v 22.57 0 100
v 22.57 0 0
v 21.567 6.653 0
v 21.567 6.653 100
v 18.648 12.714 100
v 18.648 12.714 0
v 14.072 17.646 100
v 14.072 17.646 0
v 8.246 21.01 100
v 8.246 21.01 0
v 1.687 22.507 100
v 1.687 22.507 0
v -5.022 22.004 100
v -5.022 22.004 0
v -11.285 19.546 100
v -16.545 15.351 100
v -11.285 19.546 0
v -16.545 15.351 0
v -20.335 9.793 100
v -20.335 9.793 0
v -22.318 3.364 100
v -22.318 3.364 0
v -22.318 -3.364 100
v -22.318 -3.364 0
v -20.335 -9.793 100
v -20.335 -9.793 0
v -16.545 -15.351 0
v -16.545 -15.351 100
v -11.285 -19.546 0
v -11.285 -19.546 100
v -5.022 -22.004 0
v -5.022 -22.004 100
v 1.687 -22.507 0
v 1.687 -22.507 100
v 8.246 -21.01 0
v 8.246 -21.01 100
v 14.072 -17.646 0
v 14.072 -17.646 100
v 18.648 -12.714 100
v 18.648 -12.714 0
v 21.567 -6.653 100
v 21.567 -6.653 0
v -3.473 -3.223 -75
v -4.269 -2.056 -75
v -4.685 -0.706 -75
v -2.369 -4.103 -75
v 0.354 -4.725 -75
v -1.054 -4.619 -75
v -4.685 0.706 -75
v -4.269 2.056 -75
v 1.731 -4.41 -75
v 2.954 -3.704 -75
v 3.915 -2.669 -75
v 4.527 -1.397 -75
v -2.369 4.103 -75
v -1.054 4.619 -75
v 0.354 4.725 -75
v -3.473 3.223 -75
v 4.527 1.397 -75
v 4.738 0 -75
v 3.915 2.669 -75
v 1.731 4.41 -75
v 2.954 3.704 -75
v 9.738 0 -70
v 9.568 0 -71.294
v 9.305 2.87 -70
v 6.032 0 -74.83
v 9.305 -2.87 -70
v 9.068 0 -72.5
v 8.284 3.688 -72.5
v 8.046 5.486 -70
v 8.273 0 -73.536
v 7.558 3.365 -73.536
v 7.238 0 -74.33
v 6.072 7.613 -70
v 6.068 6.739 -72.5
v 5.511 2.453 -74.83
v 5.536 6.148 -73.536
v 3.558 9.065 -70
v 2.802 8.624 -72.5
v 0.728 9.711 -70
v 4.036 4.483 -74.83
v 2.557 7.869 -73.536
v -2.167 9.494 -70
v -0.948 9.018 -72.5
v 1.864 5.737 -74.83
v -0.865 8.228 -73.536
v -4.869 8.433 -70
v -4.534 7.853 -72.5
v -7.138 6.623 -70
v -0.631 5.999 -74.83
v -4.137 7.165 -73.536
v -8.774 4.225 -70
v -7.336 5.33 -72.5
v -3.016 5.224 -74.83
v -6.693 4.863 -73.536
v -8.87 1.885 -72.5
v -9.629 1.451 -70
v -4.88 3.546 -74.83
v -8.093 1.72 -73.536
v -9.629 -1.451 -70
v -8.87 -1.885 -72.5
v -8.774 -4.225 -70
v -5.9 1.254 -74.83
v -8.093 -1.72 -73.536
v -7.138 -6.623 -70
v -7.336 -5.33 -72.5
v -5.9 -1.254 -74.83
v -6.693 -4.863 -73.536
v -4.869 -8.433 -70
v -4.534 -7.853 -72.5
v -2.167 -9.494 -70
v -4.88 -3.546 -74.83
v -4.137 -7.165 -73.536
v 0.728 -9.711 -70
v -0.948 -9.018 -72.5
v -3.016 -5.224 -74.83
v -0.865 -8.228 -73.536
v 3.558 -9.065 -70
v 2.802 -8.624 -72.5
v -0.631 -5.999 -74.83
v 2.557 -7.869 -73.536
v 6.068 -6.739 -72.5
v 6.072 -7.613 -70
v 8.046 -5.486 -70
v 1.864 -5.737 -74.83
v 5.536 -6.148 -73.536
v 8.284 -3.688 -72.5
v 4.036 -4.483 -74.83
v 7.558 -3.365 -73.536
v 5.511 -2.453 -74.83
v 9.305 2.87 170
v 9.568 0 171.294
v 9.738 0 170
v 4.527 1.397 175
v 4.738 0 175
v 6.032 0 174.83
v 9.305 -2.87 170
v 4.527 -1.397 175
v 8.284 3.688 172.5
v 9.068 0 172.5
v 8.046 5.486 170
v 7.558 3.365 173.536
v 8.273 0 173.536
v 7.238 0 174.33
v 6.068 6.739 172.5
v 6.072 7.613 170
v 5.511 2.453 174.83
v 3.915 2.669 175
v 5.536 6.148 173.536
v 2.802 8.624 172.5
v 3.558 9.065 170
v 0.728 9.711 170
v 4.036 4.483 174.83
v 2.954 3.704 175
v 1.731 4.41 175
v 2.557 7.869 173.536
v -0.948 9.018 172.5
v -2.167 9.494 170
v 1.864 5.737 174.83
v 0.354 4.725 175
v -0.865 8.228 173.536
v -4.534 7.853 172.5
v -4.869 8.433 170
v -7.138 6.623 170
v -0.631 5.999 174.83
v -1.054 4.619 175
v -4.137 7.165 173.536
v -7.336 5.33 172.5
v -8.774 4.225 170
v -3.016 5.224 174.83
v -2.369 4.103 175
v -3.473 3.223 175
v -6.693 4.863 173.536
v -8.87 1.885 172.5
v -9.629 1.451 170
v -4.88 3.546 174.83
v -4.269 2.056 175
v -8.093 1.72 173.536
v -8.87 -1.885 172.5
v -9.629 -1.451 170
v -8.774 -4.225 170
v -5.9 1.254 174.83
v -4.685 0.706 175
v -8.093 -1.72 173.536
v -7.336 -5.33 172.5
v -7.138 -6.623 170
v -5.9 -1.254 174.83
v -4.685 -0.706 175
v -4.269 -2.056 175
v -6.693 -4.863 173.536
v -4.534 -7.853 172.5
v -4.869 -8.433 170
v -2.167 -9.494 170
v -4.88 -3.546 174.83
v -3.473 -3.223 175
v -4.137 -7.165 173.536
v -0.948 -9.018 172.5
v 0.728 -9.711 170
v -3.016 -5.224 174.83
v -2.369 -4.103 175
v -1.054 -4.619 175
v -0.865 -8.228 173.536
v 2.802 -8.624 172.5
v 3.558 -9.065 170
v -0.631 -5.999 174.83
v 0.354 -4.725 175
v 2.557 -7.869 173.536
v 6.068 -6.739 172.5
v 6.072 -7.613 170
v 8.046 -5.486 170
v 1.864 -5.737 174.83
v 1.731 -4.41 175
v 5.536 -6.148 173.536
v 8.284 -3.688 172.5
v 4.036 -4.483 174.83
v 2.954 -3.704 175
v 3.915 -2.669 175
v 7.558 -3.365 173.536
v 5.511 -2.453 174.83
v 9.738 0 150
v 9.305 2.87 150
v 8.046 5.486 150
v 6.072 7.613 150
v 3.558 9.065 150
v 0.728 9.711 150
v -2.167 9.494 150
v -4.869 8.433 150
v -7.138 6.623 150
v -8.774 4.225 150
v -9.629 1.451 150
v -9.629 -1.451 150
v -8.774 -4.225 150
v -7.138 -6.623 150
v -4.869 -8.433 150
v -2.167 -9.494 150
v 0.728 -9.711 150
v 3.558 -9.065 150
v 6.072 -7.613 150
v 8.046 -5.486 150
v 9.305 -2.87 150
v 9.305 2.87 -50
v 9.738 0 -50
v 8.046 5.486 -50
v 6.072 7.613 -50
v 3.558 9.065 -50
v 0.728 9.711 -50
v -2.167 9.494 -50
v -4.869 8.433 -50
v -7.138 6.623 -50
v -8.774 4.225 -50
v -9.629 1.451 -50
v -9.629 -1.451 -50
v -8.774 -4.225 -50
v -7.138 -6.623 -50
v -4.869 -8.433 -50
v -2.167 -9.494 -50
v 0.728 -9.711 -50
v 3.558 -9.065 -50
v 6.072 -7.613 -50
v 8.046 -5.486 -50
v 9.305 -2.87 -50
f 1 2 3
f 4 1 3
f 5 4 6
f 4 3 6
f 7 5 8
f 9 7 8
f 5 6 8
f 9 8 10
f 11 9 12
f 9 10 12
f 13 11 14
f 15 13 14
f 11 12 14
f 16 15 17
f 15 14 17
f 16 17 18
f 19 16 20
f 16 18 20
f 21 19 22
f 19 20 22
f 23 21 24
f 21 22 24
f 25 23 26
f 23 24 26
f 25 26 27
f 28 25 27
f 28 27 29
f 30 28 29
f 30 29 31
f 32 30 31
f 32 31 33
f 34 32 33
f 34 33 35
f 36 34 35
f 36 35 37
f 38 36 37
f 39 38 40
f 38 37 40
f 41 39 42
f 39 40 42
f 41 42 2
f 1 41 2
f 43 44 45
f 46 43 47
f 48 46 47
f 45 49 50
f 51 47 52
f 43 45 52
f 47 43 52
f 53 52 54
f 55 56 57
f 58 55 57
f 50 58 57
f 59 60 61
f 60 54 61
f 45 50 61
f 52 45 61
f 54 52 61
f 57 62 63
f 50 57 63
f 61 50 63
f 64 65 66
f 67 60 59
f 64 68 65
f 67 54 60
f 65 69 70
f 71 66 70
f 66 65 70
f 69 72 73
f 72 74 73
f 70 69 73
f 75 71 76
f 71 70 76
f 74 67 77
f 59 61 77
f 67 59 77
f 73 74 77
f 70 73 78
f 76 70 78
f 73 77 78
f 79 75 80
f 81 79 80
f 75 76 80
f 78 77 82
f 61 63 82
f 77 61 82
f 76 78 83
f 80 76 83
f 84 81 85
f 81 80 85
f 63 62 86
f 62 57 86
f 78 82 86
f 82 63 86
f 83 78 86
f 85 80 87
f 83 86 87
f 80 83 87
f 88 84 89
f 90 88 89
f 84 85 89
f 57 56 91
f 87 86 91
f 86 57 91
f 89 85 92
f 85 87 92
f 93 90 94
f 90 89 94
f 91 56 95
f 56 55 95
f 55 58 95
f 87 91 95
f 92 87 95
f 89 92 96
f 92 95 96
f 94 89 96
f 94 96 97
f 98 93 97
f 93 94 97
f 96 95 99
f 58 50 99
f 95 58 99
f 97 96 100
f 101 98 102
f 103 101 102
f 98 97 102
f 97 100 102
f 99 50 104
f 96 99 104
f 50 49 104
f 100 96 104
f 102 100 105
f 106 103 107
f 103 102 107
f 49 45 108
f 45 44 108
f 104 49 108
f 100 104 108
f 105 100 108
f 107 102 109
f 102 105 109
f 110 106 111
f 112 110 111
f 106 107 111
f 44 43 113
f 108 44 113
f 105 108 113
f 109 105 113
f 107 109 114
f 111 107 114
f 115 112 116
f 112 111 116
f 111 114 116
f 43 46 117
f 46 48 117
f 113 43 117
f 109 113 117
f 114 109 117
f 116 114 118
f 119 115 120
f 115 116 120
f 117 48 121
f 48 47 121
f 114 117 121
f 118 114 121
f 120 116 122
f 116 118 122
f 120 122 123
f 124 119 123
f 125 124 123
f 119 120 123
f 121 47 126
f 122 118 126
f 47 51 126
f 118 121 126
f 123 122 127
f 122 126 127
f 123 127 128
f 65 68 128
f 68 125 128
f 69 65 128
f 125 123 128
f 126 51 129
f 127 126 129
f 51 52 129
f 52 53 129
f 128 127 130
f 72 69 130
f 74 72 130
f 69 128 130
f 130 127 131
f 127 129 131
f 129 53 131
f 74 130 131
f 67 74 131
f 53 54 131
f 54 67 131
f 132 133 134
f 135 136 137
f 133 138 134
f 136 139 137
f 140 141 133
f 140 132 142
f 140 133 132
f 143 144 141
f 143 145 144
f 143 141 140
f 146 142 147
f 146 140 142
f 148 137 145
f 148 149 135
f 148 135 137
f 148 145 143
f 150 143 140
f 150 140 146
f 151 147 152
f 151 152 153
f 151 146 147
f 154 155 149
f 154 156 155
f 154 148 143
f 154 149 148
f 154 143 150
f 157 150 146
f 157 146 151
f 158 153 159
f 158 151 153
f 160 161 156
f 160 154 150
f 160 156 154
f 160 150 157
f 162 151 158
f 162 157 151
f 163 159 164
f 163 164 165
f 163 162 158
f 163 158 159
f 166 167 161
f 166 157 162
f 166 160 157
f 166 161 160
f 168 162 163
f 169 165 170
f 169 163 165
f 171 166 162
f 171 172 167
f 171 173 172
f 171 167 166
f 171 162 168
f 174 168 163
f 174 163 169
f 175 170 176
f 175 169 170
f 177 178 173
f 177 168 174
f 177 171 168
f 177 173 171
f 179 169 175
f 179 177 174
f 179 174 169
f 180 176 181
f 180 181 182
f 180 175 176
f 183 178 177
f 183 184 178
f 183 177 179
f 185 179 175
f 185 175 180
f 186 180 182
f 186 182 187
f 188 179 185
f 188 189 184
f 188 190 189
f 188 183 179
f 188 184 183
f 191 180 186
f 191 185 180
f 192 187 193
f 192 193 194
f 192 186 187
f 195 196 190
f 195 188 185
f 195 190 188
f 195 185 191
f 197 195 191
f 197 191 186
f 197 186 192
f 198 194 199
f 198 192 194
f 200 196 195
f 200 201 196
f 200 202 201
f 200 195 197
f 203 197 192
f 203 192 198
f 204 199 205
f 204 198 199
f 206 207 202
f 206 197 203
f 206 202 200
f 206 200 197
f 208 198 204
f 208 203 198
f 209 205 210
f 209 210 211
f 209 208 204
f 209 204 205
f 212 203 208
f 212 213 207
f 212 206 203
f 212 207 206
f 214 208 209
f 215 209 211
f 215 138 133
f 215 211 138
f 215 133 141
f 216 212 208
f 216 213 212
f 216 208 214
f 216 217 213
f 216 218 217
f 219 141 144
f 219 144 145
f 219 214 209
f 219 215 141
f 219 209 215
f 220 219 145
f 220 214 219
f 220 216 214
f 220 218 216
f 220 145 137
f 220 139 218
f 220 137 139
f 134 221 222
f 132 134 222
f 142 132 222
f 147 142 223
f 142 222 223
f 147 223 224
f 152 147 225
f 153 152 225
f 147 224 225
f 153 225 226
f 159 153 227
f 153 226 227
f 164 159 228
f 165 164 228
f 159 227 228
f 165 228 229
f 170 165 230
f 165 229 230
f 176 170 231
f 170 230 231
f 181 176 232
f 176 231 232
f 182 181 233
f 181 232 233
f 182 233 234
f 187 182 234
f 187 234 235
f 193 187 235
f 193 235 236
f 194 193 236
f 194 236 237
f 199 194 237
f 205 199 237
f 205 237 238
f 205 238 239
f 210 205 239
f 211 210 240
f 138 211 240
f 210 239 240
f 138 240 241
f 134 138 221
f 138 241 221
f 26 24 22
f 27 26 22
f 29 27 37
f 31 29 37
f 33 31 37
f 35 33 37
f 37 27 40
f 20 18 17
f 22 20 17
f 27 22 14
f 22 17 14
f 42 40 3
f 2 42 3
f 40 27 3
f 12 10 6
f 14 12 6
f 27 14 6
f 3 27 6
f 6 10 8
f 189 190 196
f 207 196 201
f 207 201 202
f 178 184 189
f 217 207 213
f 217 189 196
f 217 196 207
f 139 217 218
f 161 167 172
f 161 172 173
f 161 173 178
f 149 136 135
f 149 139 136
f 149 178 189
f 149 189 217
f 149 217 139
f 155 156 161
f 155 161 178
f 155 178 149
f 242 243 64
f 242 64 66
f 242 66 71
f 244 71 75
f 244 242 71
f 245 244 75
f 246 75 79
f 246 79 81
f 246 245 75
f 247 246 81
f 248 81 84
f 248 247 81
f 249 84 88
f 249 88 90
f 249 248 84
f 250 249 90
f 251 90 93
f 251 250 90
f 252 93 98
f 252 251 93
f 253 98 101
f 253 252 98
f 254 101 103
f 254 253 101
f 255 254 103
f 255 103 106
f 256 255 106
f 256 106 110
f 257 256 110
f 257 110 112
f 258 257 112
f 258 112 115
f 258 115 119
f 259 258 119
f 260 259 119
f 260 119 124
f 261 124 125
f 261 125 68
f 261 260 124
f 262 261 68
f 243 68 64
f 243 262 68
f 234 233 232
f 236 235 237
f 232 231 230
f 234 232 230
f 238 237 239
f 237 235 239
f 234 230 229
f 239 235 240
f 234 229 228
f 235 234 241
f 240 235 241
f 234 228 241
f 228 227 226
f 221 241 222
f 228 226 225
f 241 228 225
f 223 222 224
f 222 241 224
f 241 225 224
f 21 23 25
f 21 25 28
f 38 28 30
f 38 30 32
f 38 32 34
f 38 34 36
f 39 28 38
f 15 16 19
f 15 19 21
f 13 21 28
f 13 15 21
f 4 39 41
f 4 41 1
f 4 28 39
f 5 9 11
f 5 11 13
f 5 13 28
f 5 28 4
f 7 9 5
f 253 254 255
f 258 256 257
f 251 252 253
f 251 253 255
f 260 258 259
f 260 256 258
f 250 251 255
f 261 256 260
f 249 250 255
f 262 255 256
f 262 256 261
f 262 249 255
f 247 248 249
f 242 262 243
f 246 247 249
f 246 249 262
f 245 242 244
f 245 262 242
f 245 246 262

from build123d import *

# Parameters (mm, degrees)
F0_R     = 22.5696692522
F1_DEPTH = 100
F7_R     = 9.7379485752
F8_DEPTH = 25
F9_R     = 5


# Not quite as in the source:
# - a feature of the source that left no trace in its solid (it failed there, or was rolled back) is left out
# - the program builds the solid bodies; features that only make, move or delete a surface that nothing else refers to are left out


with BuildPart() as f1:
    # F0 (on Top) → F1 (new body)
    with BuildSketch(Plane.XY):
        Circle(F0_R)
    extrude(amount=F1_DEPTH)


with BuildPart() as f8:
    # F7 (on offset) → F8 (new body)
    with BuildSketch(Plane.XY.offset(150)):
        Circle(F7_R)
    extrude(amount=F8_DEPTH)

    # F9
    f9_edges = [f8.edges().sort_by_distance(p)[0] for p in [
        (-9.737949, 0, 175),
    ]]
    fillet(f9_edges, radius=F9_R)


with BuildPart() as f10_1:
    # F10: instance of F8
    add(f8.part.mirror(Plane.XY.offset(50)))


solid = Compound([f1.part, f8.part, f10_1.part])
